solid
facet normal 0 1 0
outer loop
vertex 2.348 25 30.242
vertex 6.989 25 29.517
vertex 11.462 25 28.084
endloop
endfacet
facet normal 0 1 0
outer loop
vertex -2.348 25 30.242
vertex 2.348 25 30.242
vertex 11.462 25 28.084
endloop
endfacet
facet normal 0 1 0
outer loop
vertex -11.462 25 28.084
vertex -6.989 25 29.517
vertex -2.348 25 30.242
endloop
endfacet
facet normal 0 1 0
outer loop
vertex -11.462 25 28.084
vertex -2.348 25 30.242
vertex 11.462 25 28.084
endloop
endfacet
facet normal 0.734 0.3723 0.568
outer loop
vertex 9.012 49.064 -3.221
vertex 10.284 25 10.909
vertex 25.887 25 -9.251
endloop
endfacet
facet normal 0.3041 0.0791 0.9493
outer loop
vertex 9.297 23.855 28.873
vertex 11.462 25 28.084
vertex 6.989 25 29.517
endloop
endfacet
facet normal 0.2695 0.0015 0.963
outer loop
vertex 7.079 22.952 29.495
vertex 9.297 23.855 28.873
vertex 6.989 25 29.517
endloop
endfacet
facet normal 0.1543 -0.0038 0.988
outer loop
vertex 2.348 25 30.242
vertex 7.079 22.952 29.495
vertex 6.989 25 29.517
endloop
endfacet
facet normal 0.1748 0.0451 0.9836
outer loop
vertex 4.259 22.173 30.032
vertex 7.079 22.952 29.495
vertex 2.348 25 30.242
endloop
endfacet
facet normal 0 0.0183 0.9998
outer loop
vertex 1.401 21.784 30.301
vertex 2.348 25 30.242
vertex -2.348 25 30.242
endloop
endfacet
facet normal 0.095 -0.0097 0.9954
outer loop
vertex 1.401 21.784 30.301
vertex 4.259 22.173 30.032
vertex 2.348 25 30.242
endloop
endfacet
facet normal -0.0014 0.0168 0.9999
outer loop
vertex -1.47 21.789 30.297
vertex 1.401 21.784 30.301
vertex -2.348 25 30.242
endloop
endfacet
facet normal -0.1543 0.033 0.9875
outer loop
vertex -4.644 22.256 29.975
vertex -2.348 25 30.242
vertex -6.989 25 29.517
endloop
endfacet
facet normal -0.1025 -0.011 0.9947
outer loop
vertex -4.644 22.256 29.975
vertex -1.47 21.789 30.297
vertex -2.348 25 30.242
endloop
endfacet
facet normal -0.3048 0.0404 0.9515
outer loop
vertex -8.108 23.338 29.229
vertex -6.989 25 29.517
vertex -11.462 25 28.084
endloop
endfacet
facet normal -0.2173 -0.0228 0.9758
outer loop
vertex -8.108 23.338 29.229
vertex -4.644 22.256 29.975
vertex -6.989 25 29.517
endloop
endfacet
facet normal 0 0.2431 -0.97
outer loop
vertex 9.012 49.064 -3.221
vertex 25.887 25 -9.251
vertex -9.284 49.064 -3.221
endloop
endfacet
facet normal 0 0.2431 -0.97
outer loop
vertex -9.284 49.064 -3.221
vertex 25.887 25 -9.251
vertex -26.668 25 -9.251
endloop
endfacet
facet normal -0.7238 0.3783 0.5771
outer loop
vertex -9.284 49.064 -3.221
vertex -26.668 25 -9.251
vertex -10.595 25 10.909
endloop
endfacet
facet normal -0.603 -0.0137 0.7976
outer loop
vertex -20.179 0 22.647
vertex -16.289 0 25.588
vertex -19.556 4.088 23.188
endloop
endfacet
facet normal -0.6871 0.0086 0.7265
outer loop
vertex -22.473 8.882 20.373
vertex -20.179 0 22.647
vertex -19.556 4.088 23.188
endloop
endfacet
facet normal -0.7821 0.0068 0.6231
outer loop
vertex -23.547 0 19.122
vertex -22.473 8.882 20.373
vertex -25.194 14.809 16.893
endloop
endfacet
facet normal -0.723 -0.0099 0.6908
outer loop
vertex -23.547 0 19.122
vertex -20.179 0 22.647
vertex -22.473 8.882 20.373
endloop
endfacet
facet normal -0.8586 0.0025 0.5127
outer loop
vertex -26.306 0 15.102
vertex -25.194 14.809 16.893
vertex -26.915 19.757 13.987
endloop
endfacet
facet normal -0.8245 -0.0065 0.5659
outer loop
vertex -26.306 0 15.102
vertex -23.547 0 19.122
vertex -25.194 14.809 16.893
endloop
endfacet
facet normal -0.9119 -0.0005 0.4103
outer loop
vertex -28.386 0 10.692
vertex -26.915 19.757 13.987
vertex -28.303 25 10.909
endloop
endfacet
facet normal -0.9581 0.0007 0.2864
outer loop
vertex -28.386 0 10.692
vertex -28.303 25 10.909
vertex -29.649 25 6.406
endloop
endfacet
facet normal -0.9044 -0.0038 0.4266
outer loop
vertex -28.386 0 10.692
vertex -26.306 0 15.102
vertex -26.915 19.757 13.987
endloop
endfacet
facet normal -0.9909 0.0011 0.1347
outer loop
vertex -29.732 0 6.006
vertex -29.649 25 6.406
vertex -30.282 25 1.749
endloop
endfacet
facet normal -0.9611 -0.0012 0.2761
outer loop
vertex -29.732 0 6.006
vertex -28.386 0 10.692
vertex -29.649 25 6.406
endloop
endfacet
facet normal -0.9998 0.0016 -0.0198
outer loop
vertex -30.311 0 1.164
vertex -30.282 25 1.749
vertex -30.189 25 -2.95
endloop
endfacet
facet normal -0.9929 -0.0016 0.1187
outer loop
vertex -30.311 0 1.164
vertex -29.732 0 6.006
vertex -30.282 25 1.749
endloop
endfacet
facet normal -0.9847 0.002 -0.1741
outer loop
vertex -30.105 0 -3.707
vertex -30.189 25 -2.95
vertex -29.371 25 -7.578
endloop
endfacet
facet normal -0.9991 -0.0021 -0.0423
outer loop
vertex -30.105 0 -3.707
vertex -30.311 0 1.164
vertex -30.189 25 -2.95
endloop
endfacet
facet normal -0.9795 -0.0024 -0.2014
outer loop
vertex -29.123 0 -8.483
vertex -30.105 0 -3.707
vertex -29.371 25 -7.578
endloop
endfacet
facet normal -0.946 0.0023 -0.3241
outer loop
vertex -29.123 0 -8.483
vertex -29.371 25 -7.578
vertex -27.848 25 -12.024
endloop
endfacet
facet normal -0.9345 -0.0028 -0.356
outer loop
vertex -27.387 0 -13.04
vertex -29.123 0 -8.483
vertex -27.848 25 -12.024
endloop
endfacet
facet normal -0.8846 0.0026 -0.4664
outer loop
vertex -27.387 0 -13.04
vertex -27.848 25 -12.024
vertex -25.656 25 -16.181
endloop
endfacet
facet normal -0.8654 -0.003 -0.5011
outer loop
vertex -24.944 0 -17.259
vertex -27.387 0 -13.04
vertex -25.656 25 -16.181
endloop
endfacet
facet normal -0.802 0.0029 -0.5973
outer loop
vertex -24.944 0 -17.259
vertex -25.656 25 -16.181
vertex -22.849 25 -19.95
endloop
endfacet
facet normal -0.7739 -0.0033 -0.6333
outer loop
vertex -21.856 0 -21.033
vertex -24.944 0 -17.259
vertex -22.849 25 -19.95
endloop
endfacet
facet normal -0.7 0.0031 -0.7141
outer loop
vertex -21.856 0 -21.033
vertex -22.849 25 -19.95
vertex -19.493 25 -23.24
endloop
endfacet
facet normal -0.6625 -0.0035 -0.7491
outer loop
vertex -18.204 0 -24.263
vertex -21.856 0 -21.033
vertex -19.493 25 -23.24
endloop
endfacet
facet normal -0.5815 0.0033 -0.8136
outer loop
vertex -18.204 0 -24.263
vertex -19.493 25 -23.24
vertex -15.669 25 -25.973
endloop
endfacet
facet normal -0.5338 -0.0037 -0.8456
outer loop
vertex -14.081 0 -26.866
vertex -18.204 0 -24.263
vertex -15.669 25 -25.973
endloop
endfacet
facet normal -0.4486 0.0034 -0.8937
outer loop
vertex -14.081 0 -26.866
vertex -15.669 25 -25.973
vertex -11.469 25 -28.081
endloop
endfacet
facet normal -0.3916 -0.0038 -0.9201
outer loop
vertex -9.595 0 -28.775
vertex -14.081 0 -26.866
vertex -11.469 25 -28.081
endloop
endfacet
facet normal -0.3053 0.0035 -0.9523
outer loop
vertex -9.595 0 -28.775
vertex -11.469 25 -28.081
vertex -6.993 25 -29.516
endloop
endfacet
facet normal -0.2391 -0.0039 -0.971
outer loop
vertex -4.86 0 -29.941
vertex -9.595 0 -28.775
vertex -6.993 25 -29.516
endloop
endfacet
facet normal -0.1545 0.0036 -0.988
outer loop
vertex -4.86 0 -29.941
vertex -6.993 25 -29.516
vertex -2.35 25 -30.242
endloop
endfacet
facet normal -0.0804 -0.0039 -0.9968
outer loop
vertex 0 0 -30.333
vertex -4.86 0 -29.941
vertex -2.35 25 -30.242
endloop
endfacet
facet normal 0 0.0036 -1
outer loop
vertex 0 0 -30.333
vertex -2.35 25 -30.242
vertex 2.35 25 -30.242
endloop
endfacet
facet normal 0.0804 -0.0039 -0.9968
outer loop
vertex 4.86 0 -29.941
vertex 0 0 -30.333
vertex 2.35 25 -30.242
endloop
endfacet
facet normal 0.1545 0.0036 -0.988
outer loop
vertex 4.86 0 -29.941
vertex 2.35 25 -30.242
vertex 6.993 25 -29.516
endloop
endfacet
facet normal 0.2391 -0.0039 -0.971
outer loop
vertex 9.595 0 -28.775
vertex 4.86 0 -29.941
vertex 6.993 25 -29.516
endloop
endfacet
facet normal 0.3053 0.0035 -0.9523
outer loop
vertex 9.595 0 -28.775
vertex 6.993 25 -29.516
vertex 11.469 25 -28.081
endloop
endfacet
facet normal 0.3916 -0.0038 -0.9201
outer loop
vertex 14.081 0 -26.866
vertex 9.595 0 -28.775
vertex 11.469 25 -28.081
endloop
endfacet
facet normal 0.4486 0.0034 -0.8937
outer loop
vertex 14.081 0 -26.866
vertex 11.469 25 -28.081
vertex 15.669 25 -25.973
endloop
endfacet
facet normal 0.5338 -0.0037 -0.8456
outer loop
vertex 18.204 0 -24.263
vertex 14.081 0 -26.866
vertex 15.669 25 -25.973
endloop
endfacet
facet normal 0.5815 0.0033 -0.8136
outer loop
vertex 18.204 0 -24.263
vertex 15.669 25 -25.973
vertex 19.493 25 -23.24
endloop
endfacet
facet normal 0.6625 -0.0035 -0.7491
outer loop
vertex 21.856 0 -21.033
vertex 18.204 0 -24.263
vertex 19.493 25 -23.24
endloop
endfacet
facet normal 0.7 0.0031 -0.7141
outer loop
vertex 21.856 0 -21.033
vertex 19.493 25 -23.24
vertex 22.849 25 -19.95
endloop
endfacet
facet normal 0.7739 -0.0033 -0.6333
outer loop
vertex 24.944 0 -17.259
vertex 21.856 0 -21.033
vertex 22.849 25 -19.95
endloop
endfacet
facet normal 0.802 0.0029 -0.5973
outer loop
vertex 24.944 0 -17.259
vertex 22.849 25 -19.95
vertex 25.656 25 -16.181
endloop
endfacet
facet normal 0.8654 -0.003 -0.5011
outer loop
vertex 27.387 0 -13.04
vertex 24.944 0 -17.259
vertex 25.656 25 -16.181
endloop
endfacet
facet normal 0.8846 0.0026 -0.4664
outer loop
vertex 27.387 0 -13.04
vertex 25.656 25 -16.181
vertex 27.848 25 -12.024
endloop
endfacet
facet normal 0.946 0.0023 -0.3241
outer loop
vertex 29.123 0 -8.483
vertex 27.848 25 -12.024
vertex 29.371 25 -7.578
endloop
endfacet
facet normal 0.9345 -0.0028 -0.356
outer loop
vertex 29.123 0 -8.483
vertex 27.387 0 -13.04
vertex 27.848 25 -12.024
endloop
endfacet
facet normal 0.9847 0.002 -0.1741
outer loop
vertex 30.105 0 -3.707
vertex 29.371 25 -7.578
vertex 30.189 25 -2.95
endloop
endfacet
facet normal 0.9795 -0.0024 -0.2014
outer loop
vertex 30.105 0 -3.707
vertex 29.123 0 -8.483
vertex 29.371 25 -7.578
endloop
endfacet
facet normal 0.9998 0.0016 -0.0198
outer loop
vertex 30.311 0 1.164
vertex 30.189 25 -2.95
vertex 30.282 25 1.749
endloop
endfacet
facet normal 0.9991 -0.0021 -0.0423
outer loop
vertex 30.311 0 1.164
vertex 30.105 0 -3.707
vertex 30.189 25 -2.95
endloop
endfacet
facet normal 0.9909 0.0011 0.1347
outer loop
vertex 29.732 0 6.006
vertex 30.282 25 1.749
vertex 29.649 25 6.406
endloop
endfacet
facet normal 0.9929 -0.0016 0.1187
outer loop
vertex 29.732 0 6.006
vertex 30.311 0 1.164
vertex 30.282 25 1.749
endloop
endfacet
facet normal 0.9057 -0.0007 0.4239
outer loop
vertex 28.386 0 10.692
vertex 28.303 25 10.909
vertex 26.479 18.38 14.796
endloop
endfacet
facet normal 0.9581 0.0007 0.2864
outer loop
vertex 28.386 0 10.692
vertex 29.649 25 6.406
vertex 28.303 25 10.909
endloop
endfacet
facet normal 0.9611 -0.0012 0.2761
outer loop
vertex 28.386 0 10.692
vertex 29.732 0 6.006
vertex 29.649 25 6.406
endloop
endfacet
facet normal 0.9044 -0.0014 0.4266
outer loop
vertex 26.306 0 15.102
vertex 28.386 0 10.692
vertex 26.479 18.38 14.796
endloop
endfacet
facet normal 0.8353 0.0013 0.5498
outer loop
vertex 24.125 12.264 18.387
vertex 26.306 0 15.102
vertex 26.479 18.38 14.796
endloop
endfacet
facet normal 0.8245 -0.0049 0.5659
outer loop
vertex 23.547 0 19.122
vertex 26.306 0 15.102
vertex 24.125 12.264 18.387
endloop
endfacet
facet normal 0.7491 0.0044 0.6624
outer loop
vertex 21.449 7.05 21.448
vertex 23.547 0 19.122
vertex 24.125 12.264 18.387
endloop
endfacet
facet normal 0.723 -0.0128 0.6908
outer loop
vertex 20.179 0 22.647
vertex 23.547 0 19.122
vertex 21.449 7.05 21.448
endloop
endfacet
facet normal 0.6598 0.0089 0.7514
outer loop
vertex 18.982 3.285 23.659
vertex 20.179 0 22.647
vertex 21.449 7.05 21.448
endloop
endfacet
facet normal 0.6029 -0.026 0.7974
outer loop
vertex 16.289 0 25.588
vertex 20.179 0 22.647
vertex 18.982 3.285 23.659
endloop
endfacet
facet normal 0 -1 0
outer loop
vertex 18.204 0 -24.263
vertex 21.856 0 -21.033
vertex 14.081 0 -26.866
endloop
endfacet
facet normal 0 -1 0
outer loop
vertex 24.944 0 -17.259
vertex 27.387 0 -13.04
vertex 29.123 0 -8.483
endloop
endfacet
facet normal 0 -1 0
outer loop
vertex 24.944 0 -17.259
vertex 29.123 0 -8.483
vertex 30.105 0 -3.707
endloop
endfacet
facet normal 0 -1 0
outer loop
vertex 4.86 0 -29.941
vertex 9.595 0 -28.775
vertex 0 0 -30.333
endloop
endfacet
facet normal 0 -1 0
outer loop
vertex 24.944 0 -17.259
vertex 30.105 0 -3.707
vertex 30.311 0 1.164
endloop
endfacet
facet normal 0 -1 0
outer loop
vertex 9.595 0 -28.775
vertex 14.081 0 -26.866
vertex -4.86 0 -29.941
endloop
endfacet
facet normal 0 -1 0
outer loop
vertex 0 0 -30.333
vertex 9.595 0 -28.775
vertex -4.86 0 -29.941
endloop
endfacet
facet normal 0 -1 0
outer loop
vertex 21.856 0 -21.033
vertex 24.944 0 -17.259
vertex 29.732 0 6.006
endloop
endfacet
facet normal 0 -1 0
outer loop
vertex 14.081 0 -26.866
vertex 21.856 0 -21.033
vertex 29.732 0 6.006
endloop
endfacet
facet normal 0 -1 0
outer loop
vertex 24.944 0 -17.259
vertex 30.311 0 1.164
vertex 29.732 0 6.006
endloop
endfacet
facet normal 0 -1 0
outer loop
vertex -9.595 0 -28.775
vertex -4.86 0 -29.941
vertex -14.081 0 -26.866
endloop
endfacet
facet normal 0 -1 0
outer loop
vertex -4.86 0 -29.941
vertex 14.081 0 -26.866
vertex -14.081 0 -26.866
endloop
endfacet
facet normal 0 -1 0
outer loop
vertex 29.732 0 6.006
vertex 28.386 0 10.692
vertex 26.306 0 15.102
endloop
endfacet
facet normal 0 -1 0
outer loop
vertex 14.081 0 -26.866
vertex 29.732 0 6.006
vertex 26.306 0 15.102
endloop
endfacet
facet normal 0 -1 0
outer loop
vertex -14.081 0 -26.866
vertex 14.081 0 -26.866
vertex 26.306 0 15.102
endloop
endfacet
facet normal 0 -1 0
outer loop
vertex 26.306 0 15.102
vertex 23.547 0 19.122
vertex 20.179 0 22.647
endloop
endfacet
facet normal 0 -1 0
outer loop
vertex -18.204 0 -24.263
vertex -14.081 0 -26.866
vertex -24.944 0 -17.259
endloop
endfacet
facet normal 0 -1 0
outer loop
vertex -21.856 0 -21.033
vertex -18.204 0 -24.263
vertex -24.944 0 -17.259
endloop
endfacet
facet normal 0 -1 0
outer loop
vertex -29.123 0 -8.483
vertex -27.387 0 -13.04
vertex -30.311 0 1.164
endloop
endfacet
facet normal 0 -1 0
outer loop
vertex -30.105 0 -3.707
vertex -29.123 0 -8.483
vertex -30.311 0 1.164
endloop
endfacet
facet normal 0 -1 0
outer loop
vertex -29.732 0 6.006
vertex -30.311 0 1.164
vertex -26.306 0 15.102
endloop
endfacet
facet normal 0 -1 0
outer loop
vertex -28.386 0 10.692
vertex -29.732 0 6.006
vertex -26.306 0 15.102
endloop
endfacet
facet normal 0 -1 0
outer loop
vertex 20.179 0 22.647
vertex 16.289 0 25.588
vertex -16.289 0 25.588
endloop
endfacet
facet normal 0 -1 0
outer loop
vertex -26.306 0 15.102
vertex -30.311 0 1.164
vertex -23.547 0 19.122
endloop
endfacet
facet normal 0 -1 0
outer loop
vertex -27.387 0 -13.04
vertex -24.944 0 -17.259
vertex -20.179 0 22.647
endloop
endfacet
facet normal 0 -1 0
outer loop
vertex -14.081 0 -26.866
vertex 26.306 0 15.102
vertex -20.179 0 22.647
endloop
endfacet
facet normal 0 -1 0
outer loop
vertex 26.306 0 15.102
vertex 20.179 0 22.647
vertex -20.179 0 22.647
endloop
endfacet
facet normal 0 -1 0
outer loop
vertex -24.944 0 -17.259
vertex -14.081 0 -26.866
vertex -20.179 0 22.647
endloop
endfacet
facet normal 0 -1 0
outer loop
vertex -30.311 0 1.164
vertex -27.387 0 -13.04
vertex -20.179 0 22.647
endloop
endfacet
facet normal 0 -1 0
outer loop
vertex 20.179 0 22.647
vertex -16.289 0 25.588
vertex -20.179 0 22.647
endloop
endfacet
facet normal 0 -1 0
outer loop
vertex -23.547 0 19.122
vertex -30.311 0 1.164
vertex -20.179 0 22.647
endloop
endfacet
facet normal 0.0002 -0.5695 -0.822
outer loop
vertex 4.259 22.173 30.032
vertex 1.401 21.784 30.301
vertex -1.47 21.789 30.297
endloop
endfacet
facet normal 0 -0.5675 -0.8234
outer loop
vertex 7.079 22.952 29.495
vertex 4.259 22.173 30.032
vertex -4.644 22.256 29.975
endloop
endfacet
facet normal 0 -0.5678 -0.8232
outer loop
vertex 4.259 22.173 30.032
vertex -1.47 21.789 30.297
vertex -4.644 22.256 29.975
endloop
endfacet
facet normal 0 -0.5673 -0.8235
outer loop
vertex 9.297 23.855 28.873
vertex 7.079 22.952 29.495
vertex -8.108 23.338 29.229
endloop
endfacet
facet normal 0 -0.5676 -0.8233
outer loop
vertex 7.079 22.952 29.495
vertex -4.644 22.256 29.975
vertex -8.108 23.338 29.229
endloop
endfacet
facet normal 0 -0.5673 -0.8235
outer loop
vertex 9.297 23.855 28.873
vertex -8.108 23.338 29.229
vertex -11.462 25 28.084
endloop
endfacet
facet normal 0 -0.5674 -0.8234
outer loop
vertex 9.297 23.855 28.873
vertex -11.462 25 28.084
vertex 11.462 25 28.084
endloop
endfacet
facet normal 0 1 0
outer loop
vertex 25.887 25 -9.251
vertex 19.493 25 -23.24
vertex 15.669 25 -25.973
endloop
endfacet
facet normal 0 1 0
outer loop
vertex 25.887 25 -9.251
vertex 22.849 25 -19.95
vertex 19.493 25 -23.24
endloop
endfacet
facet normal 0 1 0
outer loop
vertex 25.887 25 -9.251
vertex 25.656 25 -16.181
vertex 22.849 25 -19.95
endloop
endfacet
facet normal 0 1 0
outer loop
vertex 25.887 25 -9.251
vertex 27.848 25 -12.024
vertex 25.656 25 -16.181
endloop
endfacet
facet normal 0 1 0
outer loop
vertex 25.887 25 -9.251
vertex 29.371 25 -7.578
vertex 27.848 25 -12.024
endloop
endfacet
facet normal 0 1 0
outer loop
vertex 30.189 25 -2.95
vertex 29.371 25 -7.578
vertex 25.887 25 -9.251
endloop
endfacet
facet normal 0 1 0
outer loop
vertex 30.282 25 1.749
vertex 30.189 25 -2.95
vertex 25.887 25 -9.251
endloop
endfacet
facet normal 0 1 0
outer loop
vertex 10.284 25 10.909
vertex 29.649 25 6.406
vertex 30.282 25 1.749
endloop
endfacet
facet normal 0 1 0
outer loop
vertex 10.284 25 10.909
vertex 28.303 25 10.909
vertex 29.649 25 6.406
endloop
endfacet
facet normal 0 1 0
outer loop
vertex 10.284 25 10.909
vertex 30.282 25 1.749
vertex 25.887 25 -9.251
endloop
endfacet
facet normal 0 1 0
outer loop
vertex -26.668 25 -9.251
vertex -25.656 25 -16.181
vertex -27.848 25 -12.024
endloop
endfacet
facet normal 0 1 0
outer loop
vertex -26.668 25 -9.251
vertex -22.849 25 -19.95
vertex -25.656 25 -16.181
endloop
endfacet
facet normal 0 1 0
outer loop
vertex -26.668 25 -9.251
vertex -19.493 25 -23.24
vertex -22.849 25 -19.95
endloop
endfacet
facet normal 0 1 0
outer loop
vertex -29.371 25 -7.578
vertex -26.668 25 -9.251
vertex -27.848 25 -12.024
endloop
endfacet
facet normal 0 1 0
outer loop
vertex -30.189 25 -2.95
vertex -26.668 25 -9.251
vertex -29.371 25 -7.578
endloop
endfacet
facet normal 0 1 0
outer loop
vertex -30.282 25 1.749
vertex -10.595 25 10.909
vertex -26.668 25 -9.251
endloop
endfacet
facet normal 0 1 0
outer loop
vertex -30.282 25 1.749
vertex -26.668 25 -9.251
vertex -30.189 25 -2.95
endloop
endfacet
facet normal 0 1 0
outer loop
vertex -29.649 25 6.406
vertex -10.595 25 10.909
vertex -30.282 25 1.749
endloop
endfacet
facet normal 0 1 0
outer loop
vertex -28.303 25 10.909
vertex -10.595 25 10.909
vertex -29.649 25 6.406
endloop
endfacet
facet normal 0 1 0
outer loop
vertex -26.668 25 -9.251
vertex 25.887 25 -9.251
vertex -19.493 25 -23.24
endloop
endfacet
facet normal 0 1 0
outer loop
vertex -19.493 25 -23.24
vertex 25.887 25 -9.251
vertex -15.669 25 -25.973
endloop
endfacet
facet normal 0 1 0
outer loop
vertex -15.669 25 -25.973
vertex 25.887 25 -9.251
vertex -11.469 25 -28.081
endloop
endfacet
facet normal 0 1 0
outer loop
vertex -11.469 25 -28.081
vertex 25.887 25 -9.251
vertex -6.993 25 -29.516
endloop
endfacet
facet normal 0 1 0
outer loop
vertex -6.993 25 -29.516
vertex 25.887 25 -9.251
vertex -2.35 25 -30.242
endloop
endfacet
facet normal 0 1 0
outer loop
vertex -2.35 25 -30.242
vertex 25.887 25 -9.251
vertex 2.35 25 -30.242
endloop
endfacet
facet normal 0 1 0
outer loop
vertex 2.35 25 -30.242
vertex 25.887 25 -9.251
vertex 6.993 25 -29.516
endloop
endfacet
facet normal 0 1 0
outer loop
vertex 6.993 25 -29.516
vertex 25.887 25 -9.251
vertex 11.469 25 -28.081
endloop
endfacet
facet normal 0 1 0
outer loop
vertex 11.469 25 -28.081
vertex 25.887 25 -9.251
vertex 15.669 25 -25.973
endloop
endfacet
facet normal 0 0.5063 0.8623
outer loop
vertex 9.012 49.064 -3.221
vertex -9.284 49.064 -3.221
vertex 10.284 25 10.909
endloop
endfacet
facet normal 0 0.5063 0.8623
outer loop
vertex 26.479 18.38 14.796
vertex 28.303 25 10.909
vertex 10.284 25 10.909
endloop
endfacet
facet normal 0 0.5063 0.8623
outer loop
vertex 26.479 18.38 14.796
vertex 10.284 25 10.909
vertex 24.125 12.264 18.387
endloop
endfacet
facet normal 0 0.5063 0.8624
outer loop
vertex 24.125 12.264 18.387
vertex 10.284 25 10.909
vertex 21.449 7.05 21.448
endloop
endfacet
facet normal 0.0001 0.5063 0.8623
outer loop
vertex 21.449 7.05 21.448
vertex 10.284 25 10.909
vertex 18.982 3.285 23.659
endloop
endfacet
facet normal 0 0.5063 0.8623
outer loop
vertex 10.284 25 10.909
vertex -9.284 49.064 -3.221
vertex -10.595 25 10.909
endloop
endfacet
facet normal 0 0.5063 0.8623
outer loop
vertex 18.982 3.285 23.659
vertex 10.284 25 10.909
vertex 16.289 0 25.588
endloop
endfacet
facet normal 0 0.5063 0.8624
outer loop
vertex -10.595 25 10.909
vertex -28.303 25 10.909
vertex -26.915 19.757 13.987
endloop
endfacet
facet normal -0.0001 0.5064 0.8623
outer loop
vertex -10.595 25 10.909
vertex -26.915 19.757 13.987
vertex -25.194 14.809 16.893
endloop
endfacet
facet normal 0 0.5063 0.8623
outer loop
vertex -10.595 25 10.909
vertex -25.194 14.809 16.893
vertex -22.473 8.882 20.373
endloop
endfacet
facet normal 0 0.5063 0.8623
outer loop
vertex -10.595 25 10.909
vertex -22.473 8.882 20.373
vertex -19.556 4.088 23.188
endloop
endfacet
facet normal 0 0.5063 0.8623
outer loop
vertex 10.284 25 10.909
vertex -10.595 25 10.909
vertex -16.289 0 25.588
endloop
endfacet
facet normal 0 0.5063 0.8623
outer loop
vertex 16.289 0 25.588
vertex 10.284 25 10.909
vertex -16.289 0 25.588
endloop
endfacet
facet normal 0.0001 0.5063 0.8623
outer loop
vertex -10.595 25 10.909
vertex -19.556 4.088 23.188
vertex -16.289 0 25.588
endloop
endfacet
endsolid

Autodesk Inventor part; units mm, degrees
ref_plane "YZ Plane" through (0, 0, 0) normal (1, 0, 0) x (0, 1, 0)
ref_plane "XZ Plane" through (0, 0, 0) normal (0, 1, 0) x (-1, 0, 0)
ref_plane "XY Plane" through (0, 0, 0) normal (0, 0, 1) x (1, 0, 0)
sketch "Эскиз1" plane through (0, 0, 0) normal (0, 1, 0) x (-1, 0, 0)
  circle A0 centre (0, 0) radius 30.3329
extrude "Выдавливание1" add sketch "Эскиз1" along normal blind 25
sketch "Эскиз2" plane through (0, 25, 0) normal (0, 1, 0) x (1, 0, 0)
  line L0 (0, -24.1972) -> (-26.6685, 9.2514)
  line L1 (-26.6685, 9.2514) -> (25.8868, 9.2514)
  line L2 (25.8868, 9.2514) -> (0, -24.1972)
  point P0 (0, 0)
  point P1 (0, 0)
ref_plane "РабПлоскость1" through (0, 25, 0) normal (0, 1, 0) x (1, 0, 0)
sketch "Эскиз6" plane through (0, 0, 0) normal (1, 0, 0) x (0, 1, 0)
  point P0 (0, 0)
  point P1 (61.9153, 0)
loft "Лофт3" add profiles "Эскиз2" section 1 point at (0, 61.9153, 0)
sketch "Эскиз7" plane through (0, 0, 0) normal (1, 0, 0) x (0, 1, 0)
  line L0 (61.9153, 0) -> (25, -9.2514) projected
  line L1 (49.0637, -3.2208) -> (0, 25.588)
  line L2 (0, -30.3329) -> (0, 30.3329) projected
  line L3 (0, 45.3133) -> (65.7508, 0)
  line L4 (65.7508, 0) -> (51.8075, -4.8318)
  line L5 (51.8075, -4.8318) -> (49.0637, -3.2208)
  line L6 (0, 45.3133) -> (0, 25.588)
  point P0 (0, 0)
extrude "Выдавливание3" cut sketch "Эскиз7" along normal mid plane 356
properties part number "Даник"
